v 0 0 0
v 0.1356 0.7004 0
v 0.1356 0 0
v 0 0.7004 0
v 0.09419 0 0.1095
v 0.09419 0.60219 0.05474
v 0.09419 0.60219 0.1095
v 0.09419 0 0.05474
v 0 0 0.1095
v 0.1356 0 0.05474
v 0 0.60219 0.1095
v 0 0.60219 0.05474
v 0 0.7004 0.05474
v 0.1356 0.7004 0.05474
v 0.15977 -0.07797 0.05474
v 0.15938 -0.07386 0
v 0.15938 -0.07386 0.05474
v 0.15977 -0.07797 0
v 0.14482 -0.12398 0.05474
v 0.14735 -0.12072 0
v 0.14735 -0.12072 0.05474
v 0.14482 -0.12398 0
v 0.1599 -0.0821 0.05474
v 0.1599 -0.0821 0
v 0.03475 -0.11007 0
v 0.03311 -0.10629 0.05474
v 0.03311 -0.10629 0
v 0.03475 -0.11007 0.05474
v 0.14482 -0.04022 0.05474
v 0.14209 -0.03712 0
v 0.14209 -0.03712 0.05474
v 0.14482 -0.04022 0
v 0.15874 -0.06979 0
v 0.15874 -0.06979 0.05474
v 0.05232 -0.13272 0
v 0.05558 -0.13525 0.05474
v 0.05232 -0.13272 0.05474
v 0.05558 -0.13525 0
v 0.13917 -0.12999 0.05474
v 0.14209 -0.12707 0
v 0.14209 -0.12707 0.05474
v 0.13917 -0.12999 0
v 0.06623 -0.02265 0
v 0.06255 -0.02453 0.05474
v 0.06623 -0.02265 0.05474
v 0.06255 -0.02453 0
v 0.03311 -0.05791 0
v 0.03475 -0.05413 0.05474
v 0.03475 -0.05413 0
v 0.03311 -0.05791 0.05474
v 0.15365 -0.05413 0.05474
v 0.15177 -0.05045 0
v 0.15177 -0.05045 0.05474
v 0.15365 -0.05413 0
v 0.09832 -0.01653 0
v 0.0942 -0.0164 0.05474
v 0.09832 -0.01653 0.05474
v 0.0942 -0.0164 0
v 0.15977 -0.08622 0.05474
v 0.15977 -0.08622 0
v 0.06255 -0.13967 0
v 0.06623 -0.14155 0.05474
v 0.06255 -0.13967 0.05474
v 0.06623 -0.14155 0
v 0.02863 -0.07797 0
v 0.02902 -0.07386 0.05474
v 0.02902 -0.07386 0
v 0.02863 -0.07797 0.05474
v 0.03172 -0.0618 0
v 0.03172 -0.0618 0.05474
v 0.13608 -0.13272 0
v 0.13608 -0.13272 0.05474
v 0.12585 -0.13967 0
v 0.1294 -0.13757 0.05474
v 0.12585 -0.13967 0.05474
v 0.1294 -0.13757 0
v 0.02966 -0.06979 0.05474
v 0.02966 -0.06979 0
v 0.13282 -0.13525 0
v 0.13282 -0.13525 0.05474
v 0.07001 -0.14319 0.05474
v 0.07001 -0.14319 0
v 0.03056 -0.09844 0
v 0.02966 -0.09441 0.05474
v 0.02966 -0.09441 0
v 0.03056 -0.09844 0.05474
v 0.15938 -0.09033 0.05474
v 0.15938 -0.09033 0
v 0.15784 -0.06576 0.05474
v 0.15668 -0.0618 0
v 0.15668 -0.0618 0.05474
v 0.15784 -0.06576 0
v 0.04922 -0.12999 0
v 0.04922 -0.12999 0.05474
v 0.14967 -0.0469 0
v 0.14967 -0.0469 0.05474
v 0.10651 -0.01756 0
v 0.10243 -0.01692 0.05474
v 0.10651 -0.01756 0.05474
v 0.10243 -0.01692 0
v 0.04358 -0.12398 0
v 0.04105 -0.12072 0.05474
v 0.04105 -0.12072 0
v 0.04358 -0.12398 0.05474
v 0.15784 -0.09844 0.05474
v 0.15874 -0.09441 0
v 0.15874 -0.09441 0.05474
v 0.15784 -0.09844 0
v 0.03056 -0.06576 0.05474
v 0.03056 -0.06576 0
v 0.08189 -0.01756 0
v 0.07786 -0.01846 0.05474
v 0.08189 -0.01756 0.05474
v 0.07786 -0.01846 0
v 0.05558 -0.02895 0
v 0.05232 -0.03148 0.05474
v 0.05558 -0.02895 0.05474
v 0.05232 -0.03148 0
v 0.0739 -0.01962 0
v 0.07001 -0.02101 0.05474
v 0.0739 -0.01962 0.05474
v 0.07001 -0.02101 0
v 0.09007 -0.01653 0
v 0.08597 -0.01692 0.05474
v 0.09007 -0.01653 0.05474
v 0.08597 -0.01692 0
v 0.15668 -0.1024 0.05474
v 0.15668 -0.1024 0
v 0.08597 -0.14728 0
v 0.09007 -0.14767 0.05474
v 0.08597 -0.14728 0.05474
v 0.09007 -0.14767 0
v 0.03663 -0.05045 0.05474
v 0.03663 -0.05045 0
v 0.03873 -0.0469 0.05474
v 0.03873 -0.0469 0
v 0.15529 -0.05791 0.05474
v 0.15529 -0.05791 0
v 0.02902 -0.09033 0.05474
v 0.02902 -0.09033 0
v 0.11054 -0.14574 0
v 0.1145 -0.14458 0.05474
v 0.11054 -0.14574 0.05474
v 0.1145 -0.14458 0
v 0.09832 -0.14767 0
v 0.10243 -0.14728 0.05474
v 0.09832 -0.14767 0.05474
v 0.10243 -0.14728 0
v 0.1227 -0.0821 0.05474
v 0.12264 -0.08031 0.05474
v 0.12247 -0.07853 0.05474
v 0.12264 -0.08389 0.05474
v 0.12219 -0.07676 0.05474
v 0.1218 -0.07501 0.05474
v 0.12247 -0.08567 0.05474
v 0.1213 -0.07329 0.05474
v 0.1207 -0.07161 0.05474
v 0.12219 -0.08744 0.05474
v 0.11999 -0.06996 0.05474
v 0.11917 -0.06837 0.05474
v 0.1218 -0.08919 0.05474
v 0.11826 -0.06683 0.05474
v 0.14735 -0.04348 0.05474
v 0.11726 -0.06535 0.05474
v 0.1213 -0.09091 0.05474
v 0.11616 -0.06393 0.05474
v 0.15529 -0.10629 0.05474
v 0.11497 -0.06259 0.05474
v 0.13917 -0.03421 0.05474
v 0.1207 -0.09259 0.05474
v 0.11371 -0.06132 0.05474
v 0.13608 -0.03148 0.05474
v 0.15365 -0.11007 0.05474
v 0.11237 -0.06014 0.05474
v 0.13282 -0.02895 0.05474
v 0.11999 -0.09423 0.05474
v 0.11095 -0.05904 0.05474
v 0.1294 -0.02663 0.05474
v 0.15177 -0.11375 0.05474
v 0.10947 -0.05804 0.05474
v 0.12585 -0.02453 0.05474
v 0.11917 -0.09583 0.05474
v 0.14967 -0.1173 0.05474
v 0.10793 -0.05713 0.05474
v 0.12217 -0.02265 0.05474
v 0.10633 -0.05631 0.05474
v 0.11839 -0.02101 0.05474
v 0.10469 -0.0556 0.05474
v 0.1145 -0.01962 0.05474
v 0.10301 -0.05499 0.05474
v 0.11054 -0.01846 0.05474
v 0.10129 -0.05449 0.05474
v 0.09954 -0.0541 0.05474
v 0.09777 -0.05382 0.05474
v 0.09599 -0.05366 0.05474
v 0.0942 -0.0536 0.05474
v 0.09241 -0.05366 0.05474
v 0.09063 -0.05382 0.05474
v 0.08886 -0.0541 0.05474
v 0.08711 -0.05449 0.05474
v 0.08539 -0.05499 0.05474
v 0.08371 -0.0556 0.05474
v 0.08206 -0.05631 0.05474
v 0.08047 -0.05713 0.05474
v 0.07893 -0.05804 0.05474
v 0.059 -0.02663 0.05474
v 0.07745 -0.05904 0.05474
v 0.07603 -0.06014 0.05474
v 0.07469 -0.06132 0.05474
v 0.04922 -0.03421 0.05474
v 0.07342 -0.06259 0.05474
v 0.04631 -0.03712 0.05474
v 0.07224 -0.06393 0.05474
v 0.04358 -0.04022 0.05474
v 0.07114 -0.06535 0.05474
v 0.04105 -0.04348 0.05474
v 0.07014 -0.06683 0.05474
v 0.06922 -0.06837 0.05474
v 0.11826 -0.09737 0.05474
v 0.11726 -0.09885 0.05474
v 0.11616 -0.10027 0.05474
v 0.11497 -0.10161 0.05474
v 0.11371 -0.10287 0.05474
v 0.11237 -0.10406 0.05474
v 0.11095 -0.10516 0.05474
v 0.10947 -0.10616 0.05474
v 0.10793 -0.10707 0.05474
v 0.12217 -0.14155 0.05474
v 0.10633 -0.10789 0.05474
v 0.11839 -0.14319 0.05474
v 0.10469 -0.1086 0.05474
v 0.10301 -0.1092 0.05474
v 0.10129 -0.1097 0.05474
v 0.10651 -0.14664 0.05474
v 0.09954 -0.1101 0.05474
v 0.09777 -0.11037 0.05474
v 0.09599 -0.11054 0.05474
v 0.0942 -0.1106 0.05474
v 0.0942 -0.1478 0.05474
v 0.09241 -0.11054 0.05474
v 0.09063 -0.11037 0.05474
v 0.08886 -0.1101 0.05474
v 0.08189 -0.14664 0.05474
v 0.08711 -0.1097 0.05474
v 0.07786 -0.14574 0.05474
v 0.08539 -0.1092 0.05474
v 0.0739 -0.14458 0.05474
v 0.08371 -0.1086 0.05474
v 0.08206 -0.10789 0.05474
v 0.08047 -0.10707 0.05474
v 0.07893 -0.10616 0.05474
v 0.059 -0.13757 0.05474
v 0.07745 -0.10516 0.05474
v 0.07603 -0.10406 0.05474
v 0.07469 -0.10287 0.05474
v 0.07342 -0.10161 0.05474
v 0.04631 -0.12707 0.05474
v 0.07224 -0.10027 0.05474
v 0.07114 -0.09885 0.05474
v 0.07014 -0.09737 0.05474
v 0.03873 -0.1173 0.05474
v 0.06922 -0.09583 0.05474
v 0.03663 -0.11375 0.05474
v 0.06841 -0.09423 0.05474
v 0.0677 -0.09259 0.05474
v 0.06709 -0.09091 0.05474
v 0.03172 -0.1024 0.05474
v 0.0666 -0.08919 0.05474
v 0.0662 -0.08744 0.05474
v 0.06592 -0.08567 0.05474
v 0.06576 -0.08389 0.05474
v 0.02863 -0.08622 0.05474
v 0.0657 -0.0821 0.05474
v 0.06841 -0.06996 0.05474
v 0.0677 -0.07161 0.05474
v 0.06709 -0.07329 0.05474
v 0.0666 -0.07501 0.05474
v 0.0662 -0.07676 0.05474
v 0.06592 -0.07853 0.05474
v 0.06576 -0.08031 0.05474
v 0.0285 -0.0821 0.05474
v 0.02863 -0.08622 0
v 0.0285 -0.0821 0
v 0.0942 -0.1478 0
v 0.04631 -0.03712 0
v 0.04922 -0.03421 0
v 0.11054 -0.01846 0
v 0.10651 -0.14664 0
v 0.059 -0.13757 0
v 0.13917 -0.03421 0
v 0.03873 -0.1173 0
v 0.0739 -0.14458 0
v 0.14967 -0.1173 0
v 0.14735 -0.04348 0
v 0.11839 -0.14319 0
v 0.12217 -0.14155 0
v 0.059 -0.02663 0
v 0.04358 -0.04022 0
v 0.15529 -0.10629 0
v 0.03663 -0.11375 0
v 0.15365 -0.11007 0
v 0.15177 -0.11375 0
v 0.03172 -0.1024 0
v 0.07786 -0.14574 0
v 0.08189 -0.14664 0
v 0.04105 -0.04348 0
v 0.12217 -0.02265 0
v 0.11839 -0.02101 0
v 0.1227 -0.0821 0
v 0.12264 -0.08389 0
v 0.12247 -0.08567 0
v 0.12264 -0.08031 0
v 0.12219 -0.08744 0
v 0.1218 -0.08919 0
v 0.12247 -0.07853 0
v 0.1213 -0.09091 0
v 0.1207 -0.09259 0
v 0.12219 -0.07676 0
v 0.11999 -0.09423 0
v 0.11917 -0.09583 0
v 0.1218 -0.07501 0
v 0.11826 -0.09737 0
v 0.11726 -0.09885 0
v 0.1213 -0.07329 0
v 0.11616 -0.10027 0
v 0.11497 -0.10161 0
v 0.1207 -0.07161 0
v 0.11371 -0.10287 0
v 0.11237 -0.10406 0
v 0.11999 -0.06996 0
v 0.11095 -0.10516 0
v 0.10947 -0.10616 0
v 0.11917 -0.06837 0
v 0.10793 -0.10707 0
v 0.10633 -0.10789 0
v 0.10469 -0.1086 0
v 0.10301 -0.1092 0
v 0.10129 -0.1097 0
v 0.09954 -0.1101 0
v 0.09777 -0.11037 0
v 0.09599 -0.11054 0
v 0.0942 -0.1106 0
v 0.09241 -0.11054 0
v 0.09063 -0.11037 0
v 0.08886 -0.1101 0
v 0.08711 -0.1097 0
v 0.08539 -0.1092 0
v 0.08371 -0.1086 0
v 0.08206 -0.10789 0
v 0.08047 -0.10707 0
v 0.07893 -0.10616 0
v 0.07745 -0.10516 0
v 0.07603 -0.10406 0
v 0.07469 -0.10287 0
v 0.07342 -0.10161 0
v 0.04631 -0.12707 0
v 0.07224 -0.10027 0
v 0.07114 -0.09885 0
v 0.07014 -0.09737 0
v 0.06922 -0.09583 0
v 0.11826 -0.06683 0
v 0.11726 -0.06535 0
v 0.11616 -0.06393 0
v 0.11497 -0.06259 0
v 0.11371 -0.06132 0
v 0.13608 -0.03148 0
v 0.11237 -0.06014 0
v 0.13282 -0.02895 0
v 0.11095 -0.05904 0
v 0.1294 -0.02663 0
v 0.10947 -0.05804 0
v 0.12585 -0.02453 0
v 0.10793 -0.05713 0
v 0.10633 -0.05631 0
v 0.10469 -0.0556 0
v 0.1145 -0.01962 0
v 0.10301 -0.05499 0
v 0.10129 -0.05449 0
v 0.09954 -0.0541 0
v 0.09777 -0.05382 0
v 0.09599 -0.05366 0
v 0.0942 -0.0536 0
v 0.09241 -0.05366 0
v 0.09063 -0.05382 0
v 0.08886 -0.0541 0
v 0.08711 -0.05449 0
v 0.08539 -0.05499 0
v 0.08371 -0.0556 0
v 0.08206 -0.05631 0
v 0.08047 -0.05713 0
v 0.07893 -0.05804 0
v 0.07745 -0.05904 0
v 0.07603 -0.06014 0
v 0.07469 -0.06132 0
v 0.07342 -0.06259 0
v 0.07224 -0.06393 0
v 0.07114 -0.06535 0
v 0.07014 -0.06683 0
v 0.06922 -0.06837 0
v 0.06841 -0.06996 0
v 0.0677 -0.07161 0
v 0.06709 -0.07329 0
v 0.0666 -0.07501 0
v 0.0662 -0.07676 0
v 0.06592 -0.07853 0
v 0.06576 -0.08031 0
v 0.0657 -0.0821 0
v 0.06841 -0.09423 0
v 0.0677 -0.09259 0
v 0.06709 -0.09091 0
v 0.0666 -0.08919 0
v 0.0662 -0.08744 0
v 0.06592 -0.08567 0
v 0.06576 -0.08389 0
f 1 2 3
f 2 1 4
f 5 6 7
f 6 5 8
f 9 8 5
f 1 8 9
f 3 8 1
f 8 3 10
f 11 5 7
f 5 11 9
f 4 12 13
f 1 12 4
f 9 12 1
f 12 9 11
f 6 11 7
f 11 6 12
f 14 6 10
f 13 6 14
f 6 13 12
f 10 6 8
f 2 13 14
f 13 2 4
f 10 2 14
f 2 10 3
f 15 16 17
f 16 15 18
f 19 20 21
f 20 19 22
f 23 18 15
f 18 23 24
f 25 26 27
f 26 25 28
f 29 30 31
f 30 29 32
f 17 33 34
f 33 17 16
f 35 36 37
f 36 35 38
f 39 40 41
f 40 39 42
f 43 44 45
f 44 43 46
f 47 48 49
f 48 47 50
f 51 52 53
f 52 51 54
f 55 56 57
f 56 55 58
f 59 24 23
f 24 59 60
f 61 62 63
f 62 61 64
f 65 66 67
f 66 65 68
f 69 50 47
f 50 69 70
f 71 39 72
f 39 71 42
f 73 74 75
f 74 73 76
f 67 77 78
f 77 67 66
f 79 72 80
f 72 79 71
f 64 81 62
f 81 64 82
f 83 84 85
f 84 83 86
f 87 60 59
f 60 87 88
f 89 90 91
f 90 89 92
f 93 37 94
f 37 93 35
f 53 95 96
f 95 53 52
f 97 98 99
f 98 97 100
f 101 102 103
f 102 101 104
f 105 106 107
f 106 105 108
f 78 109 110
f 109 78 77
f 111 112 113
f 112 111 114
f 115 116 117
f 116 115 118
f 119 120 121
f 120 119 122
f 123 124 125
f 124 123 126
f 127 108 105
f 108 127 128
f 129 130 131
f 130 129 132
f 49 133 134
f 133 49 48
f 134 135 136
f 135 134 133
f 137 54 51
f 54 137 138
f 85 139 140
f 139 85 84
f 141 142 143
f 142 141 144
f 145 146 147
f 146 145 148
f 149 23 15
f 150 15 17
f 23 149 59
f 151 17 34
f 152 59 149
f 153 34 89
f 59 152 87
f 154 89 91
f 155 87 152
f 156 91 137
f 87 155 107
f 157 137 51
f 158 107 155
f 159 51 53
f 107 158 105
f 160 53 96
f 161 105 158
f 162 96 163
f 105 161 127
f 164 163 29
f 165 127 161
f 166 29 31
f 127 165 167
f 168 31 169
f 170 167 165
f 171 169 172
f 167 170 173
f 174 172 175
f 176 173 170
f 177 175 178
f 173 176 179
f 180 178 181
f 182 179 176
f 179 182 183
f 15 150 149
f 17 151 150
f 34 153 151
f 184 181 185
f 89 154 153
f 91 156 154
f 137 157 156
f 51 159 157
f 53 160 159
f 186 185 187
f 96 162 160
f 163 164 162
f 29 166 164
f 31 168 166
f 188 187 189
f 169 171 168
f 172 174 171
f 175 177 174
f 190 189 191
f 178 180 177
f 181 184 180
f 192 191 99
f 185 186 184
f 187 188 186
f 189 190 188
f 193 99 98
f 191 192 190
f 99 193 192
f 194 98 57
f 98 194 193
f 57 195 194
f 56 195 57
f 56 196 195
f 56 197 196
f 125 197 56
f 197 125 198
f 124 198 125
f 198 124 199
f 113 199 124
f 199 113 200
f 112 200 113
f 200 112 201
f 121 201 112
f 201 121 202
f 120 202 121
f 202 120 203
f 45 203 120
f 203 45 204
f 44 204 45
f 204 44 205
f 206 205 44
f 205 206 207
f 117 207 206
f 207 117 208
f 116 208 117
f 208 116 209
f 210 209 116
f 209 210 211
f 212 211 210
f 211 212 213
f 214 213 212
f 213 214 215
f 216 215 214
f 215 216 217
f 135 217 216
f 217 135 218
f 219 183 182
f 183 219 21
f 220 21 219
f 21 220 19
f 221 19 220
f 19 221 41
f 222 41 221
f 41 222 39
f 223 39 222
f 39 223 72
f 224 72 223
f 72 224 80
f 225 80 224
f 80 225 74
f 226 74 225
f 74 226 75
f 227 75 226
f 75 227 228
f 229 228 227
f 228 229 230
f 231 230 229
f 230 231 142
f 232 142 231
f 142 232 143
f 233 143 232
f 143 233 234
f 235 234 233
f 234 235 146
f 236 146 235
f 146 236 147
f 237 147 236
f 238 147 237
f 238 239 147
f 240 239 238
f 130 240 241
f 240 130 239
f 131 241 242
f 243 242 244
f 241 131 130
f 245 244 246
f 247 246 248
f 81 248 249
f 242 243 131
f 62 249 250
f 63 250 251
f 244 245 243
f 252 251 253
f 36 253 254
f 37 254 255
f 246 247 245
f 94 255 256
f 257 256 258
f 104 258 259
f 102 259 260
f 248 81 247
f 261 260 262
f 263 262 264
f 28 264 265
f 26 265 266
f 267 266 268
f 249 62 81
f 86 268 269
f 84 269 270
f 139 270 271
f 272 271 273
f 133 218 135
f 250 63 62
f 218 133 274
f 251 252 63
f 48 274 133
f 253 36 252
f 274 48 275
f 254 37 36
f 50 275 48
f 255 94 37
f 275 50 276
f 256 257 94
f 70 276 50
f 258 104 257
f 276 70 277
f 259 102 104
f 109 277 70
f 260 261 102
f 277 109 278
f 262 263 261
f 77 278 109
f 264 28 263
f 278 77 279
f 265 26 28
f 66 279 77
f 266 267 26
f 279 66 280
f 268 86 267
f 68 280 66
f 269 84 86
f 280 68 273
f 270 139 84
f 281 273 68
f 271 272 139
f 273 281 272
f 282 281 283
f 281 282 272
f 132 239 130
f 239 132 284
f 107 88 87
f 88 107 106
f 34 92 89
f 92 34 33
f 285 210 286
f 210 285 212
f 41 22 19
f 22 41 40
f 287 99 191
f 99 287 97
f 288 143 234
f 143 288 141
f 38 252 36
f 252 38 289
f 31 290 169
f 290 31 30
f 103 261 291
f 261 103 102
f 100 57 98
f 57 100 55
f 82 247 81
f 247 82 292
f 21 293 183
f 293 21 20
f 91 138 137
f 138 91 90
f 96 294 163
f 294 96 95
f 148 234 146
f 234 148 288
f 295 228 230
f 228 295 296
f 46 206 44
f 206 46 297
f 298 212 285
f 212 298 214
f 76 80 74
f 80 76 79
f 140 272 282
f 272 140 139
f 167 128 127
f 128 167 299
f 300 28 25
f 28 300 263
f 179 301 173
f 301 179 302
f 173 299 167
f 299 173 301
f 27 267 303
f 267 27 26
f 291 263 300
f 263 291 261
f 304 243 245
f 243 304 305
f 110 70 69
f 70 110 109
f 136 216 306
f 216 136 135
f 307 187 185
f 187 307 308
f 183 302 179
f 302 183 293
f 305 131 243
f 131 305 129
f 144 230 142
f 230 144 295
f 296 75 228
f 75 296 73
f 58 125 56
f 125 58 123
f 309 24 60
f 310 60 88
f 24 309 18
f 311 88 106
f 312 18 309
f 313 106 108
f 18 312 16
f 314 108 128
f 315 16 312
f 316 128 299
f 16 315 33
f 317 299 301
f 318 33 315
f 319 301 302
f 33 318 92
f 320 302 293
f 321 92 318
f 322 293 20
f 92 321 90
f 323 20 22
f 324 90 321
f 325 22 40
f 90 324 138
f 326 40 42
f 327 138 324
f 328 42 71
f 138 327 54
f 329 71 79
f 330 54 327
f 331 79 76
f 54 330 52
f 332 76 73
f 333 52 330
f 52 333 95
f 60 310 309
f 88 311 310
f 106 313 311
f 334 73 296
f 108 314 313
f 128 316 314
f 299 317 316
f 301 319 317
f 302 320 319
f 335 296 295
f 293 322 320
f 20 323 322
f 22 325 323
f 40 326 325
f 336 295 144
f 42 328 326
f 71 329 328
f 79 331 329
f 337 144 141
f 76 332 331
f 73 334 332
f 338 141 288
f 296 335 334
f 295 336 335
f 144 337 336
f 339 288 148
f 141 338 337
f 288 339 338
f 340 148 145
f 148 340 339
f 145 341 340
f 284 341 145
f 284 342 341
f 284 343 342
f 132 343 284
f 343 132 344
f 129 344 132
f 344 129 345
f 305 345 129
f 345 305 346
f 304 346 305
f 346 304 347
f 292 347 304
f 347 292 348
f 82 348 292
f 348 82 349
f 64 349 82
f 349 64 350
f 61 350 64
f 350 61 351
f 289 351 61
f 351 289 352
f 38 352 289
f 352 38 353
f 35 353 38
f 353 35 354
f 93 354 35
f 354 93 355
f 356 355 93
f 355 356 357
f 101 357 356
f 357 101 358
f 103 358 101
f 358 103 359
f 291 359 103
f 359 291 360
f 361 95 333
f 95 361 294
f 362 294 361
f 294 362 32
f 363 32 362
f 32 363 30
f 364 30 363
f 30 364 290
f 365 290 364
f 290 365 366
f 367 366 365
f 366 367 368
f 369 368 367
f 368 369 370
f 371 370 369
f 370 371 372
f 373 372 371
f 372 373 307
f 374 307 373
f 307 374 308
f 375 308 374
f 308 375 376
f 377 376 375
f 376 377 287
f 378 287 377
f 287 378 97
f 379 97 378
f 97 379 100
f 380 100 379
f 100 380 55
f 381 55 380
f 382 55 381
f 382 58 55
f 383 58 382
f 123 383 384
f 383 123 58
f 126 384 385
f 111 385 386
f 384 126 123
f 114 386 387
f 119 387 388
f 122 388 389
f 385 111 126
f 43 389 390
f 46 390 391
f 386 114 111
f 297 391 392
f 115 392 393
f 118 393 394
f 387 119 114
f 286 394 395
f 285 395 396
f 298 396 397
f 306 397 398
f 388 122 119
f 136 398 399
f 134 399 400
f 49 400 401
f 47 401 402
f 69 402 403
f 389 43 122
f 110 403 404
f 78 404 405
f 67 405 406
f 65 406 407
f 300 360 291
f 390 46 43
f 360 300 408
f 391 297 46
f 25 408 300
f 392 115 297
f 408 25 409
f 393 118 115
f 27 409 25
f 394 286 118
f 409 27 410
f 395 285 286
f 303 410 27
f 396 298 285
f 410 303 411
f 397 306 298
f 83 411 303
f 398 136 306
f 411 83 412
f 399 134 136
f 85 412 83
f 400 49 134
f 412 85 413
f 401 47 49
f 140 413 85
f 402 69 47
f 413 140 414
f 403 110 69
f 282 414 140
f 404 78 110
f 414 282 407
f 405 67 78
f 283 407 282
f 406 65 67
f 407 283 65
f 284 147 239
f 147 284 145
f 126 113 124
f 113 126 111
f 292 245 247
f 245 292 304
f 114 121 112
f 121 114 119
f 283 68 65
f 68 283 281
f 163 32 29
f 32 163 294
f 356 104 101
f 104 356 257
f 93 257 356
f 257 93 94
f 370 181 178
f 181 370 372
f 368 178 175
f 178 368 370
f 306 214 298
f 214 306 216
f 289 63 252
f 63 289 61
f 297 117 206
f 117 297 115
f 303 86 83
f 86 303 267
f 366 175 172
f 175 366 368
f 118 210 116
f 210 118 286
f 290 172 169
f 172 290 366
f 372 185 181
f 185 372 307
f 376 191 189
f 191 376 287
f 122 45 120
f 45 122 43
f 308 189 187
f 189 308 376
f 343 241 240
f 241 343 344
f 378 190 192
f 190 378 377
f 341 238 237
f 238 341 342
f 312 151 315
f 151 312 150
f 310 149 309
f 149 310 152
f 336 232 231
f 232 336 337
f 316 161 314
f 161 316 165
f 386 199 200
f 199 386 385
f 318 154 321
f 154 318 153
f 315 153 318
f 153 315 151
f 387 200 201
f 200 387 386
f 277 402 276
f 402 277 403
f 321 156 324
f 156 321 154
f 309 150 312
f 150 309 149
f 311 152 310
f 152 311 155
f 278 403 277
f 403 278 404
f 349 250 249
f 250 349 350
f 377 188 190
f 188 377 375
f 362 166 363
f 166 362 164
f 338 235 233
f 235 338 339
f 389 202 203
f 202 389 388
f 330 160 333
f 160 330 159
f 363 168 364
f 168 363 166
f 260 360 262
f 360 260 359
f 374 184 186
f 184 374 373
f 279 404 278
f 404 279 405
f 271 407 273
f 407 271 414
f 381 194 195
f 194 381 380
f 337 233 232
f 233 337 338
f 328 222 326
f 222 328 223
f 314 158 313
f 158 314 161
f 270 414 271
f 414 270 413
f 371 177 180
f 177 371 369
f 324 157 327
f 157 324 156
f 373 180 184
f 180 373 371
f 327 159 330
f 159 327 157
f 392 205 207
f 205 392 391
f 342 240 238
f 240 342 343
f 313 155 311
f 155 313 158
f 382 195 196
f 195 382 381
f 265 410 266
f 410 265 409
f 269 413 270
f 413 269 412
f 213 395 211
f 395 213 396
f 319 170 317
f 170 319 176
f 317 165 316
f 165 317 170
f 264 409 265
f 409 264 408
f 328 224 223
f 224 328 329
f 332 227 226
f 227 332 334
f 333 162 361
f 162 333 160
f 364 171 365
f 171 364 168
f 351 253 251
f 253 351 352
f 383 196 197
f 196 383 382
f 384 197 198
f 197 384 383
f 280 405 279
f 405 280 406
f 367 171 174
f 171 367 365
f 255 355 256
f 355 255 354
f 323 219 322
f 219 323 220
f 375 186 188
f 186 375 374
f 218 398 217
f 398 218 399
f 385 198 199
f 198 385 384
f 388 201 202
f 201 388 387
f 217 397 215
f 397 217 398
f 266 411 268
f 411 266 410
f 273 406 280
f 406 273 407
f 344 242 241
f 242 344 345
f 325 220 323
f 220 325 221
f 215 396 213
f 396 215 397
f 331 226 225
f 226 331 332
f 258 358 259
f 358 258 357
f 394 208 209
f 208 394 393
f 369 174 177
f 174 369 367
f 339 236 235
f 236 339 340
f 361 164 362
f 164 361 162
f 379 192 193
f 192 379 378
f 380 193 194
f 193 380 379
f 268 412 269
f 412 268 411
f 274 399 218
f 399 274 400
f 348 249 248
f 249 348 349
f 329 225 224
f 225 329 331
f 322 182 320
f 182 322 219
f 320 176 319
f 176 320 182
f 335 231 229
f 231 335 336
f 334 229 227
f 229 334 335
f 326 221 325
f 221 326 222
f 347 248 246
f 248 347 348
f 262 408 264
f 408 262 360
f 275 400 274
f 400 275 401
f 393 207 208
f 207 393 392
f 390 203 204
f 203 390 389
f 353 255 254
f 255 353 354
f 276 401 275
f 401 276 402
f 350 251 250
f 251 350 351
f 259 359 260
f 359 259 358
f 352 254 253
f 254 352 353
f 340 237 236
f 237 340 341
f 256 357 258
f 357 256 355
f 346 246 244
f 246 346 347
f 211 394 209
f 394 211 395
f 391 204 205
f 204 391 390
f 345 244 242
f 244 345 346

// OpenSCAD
// Global Settings
$fn = 100; // Smooth curve resolution

// Main Base & Frame Parameters
main_length = 0.395255;
main_width = 0.60219;
main_height = 0.1095;
frame_thickness = 0.05; // Uniform frame wall thickness
d_straight_length = 0.0942; // Length of straight portion of D shape (matches protrusion center offset)

// Shallow Protrusion Parameters
protrusion_height = 0.054745;
protrusion_x_min = 0;
protrusion_x_max = 0.1356;
protrusion_y_min = -0.1478;
protrusion_y_max = 0.5526;
round_tab_center = [0.0942, -0.0821]; // Shared center for tab and hole
round_tab_outer_r = 0.0657;
round_tab_hole_r = 0.0285;

// 2D D Shape Module (fits exactly in main footprint)
module d_shape_2d() {
    union() {
        // Straight rectangular portion of D
        square([d_straight_length, main_width]);
        // Semicircular curved portion of D
        translate([d_straight_length, main_width/2])
        scale([1, 1, 0]) // Force 2D
        sphere(r=main_width/2);
    }
}

// Main D Frame Module
module main_d_frame() {
    difference() {
        // Outer solid D shape
        linear_extrude(height=main_height)
        d_shape_2d();
        // Inner cutout for through opening
        linear_extrude(height=main_height + 0.1, center=true)
        offset(r=-frame_thickness)
        d_shape_2d();
    }
}

// Shallow Protrusion with through hole Module
module shallow_protrusion() {
    difference() {
        union() {
            // Rectangular base of protrusion
            linear_extrude(height=protrusion_height)
            square([
                protrusion_x_max - protrusion_x_min,
                protrusion_y_max - protrusion_y_min
            ]);
            // Rounded tab portion
            translate(round_tab_center)
            linear_extrude(height=protrusion_height)
            circle(r=round_tab_outer_r);
        }
        // Concentric through hole in tab
        translate(round_tab_center)
        linear_extrude(height=protrusion_height + 0.1, center=true)
        circle(r=round_tab_hole_r);
    }
}

// Final Assembly
union() {
    main_d_frame();
    shallow_protrusion();
}
